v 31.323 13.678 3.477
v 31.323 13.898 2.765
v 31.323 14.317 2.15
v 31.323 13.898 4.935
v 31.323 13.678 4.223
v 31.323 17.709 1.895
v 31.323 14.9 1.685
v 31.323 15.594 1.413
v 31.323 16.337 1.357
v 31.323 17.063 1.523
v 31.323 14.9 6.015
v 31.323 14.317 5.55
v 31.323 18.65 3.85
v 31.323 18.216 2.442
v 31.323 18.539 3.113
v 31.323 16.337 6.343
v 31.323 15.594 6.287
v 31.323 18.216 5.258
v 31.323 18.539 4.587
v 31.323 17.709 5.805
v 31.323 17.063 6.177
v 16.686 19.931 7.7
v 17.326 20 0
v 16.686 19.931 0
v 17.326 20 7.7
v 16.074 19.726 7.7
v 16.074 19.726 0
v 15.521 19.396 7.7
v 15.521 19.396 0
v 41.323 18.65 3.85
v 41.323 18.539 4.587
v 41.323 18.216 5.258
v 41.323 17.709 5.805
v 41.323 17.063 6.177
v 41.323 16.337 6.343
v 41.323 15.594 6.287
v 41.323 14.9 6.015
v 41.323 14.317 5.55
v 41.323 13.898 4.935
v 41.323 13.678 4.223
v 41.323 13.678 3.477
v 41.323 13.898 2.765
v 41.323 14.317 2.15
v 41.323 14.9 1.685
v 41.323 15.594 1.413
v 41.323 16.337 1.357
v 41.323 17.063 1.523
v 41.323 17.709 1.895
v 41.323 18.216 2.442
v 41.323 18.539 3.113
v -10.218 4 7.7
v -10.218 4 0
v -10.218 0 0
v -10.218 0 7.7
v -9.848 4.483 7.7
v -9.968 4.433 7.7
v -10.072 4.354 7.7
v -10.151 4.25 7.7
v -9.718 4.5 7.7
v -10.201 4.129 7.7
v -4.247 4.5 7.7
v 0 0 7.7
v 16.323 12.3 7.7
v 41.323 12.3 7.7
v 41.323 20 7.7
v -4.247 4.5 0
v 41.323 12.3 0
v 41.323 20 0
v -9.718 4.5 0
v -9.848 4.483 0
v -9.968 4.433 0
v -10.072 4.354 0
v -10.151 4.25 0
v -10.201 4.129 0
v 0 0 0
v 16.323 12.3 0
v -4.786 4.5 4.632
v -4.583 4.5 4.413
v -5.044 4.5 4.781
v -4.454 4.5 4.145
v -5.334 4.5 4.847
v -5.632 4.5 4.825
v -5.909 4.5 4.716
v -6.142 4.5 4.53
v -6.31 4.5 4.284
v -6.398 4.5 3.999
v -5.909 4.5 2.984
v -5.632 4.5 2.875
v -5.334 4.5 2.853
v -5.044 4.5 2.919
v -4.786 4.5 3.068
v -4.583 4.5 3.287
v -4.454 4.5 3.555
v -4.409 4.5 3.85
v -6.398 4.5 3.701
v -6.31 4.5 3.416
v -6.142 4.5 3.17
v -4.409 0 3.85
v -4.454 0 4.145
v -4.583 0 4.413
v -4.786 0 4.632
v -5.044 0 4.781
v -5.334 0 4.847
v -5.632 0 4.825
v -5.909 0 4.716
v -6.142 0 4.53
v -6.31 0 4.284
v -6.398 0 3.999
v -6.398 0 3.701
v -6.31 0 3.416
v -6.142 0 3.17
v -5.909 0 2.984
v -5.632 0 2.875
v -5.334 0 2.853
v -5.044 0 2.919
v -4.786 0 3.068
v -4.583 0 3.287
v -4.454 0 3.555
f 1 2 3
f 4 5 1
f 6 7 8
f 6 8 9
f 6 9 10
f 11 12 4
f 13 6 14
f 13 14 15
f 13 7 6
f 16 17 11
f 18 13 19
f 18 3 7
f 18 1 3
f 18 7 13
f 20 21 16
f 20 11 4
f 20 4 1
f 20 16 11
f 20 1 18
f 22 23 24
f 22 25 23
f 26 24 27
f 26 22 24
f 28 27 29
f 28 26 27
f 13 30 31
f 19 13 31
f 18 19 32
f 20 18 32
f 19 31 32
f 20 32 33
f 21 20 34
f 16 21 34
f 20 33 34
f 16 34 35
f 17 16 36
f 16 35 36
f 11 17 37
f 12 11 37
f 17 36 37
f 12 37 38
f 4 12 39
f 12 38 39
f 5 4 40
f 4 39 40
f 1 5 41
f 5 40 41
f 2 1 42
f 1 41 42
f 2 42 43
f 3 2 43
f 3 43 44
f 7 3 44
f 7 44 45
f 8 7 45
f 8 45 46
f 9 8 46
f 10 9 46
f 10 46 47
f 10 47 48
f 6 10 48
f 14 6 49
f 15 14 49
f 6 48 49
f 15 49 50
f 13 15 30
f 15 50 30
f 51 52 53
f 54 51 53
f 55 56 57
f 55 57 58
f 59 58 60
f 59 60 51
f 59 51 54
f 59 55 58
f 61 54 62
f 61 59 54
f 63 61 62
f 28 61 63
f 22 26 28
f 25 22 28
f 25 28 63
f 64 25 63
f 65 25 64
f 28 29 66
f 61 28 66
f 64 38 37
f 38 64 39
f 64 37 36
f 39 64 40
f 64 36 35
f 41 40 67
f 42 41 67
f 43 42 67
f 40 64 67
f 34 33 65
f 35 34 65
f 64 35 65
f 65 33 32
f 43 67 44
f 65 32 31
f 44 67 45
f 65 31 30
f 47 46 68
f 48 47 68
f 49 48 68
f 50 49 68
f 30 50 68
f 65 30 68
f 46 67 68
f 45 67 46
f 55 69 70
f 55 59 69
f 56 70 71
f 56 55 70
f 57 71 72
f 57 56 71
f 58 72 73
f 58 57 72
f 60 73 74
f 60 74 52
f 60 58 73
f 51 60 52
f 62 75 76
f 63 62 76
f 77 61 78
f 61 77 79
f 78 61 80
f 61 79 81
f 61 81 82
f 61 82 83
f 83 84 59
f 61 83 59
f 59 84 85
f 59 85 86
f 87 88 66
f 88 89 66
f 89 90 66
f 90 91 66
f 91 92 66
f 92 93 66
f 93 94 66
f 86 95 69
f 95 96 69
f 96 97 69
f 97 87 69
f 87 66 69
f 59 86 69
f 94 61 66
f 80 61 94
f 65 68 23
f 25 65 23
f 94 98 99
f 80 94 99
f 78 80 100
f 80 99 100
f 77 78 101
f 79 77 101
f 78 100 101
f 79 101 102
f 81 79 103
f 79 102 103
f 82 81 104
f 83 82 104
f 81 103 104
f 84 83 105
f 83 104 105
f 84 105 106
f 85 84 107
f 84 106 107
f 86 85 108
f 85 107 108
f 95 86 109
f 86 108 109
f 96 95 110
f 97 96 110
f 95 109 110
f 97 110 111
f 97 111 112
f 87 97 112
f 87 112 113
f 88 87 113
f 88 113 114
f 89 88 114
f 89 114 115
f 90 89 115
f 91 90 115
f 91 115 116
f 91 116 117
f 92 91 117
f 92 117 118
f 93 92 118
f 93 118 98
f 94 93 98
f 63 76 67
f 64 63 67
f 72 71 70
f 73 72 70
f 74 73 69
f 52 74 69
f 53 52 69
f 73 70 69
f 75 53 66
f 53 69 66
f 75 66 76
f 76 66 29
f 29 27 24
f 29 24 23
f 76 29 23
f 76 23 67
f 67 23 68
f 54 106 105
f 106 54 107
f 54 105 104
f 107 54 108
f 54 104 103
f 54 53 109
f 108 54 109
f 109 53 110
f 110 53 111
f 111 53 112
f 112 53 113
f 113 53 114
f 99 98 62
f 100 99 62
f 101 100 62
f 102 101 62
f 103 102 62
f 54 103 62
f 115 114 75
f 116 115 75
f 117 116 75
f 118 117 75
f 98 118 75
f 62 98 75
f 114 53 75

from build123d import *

# Parameters (mm, degrees)
EXTRUDE_408_DEPTH      = 7.7
FILLET_1_R             = 3
SKETCH_4_R             = 2.5
CUT_EXTRUDE_703_DEPTH  = 10
SKETCH_5_R             = 1
CUT_EXTRUDE_1066_DEPTH = 47.549452316
FILLET_3_R             = 0.5


with BuildPart() as part:
    # 草图1 → Extrude 408 (new body)
    with BuildSketch(Plane.XY):
        Polygon((0, 0), (16.322651306, 12.3), (41.322651306, 12.3), (41.322651306, 20), (16.322651306, 20), (-4.246543429, 4.5), (-10.218245126, 4.5), (-10.218245126, 0), align=None)
    extrude(amount=EXTRUDE_408_DEPTH)

    # 圆角1
    fillet_1_edges = [part.edges().sort_by_distance(p)[0] for p in [
        (16.322651306, 20, 3.85),
    ]]
    fillet(fillet_1_edges, radius=FILLET_1_R)

    # 草图4 → Cut-Extrude 703 (cut)
    with BuildSketch(Plane(origin=(41.322651306, 0, 0), x_dir=(0, 0, -1), z_dir=(1, 0, 0))):
        with Locations(Location((-3.85, 16.15, 0), (0, 0, 90))):
            Circle(SKETCH_4_R)
    extrude(amount=-CUT_EXTRUDE_703_DEPTH, mode=Mode.SUBTRACT)

    # 草图5 → Cut-Extrude 1066 (cut, through all)
    with BuildSketch(Plane.XZ):
        with Locations((-5.409122563, 3.85)):
            Circle(SKETCH_5_R)
    extrude(amount=-CUT_EXTRUDE_1066_DEPTH, mode=Mode.SUBTRACT)

    # 圆角3
    fillet_3_edges = [part.edges().sort_by_distance(p)[0] for p in [
        (-10.218245126, 4.5, 3.85),
    ]]
    fillet(fillet_3_edges, radius=FILLET_3_R)


solid = part.part
